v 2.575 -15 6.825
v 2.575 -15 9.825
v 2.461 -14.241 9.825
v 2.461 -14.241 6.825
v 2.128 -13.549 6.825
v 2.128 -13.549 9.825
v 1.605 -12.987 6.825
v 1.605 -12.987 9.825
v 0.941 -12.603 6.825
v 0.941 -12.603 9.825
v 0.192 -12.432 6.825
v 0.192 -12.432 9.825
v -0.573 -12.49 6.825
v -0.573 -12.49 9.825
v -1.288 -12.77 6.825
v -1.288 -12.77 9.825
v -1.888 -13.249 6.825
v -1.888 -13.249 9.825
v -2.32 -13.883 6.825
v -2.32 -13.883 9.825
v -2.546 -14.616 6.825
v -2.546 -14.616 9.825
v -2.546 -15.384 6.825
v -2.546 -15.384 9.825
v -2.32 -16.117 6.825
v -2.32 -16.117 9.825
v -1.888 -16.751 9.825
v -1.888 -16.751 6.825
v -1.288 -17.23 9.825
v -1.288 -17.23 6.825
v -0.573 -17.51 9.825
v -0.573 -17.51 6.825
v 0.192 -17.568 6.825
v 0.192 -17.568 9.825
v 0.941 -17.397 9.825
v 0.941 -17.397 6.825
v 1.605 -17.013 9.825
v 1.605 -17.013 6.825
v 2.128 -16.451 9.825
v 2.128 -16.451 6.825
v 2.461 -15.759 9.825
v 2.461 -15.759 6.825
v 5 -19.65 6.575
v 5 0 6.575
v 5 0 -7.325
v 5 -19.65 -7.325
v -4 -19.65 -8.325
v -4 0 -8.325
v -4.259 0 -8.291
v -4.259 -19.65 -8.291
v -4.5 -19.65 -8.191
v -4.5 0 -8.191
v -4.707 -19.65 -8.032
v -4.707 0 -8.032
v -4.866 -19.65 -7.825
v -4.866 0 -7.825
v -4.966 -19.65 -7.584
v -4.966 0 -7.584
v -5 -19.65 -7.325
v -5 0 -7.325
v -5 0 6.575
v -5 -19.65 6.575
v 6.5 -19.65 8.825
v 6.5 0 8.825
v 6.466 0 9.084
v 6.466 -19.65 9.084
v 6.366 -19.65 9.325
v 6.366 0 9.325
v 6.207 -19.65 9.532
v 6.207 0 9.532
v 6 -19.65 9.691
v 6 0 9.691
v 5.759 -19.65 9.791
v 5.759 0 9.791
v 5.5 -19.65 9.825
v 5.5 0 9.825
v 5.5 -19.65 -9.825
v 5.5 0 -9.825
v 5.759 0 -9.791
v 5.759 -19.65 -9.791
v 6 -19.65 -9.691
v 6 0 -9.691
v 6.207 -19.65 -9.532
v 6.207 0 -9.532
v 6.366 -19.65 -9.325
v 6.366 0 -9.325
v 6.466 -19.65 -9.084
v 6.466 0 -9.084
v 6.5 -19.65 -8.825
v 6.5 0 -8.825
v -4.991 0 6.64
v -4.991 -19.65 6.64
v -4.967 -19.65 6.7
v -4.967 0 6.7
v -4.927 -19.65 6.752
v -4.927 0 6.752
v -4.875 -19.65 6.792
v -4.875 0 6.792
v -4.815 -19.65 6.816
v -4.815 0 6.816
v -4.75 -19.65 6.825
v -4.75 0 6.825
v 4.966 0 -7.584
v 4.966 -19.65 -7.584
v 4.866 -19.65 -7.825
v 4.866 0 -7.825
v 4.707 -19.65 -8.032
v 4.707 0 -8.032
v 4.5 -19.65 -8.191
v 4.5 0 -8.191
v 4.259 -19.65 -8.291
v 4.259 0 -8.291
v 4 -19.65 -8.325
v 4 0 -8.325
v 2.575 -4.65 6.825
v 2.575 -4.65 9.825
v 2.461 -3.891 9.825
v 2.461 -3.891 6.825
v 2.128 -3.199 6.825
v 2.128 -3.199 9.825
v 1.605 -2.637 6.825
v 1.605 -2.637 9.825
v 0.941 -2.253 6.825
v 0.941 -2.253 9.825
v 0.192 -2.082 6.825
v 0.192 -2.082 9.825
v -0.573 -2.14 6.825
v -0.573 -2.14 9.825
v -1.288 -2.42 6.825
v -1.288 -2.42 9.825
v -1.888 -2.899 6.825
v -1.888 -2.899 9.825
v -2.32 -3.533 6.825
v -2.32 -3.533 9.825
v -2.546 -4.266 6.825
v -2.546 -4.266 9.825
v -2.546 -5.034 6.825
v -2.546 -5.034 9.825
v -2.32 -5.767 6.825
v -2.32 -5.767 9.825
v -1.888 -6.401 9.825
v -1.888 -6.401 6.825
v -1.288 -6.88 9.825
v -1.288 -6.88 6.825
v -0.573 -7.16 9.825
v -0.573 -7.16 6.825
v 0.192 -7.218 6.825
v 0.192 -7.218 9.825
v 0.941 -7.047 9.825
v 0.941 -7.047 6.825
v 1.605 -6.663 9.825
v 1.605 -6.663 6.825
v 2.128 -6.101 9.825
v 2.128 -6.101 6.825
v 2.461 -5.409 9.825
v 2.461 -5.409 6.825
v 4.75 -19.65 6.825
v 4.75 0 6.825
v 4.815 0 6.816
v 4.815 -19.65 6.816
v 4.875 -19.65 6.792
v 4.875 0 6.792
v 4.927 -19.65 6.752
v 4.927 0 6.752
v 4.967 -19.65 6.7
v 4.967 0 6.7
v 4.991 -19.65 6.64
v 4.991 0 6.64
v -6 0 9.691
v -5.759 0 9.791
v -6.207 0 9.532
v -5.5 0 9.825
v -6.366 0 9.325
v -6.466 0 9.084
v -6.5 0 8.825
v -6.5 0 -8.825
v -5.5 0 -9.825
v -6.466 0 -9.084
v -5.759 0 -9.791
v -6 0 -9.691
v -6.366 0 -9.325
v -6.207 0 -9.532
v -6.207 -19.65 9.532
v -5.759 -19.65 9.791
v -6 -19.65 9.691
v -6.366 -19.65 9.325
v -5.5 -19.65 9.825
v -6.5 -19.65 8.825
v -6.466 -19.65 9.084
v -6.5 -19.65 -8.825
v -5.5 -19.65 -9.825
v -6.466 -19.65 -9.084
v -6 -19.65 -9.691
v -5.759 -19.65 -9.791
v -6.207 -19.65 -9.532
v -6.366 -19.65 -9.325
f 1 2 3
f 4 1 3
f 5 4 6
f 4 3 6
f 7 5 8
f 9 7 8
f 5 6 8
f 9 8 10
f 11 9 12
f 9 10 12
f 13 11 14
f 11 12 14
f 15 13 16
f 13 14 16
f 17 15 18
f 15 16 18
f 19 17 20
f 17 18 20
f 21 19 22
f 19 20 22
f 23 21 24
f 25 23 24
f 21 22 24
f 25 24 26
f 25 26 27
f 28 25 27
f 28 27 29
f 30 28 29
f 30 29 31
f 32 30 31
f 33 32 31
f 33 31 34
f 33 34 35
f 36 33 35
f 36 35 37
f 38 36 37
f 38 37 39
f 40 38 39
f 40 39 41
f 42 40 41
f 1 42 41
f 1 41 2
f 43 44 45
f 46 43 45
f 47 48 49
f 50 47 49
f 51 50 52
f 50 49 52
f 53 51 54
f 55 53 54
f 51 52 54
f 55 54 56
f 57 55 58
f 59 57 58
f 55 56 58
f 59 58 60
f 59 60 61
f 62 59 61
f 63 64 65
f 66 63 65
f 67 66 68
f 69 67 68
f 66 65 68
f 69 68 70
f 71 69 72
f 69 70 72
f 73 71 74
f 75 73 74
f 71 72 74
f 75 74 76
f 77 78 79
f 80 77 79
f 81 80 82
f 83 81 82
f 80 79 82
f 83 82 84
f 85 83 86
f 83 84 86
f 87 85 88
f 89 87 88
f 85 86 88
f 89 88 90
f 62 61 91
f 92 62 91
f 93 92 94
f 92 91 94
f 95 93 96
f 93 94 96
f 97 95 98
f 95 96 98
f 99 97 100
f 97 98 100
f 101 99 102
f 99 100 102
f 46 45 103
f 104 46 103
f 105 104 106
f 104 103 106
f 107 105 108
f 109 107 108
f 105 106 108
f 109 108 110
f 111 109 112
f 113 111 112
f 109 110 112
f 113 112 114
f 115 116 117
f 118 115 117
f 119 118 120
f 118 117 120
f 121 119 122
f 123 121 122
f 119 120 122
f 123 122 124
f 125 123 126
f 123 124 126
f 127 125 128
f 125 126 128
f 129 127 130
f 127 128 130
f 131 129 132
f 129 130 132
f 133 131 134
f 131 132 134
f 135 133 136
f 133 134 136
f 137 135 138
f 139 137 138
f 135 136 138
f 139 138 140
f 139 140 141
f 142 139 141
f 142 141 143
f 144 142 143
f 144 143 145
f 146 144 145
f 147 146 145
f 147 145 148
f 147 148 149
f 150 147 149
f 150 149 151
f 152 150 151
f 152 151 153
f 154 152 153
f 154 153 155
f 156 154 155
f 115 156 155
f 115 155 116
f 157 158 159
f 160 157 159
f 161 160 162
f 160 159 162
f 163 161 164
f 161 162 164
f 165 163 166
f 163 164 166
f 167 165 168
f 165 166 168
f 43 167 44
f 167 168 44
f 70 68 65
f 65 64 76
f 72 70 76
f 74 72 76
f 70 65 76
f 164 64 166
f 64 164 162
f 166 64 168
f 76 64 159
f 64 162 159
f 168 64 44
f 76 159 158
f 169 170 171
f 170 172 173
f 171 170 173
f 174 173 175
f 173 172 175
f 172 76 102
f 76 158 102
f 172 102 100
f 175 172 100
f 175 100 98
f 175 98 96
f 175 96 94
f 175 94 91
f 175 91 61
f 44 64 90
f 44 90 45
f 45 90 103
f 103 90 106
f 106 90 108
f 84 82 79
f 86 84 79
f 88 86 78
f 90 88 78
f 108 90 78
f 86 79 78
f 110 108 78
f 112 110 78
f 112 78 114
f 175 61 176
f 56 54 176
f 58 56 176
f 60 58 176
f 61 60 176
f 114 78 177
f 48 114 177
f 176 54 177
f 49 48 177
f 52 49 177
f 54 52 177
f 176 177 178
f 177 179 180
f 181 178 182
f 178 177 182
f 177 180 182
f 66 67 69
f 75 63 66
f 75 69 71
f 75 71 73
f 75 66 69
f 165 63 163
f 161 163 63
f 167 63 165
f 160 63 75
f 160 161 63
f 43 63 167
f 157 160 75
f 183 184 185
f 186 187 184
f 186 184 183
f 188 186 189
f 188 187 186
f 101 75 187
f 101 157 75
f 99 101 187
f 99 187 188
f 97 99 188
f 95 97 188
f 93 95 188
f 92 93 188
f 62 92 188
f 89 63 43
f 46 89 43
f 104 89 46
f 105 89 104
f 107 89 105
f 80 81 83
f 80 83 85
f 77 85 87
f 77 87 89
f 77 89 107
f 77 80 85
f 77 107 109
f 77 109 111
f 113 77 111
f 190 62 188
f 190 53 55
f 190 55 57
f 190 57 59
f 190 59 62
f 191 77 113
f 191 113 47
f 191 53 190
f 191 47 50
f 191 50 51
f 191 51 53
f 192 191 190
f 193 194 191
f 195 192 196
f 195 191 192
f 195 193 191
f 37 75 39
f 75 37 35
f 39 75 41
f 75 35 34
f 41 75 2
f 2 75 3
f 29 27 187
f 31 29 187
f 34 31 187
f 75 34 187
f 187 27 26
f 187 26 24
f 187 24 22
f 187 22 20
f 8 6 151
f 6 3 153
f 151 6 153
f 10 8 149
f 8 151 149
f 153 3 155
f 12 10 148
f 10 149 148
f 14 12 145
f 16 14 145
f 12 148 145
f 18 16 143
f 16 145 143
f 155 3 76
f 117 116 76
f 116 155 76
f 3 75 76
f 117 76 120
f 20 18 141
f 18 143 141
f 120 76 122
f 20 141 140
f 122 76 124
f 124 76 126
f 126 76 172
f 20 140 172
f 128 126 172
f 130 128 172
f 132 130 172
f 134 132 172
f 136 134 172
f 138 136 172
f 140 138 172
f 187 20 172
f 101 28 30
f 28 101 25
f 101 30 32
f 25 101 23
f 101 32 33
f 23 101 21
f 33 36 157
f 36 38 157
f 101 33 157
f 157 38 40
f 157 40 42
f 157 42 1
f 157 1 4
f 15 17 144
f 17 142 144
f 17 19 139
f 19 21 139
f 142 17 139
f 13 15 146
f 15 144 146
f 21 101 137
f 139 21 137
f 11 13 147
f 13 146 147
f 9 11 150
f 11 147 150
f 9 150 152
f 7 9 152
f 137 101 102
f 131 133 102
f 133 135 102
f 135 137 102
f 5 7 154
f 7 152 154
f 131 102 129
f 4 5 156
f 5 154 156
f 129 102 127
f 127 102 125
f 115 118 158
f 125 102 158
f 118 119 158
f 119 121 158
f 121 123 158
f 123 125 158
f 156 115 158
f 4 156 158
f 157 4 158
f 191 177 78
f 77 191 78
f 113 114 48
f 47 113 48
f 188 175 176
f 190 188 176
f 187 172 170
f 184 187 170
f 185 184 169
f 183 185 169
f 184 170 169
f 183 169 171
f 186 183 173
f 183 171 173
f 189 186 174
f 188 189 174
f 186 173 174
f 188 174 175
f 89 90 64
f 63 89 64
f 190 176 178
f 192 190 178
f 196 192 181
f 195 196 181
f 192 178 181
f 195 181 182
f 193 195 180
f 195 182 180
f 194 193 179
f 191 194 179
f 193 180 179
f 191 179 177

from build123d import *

# Parameters (mm, degrees)
SALIENTE_EXTRUIR1_DEPTH = 19.65
CROQUIS2_R              = 2.575
CORTAR_EXTRUIR1_DEPTH   = 8.65


with BuildPart() as part:
    # Croquis1 → Saliente-Extruir1 (new body)
    with BuildSketch(Plane(origin=(0, 0, 0), x_dir=(1, 0, 0), z_dir=(0, 1, 0))):
        with BuildLine():
            Line((-5.5, 9.825), (5.5, 9.825))
            ThreePointArc((5.5, 9.825), (6.207106781, 9.532106781), (6.5, 8.825))
            Line((6.5, 8.825), (6.5, -8.825))
            ThreePointArc((6.5, -8.825), (6.207106781, -9.532106781), (5.5, -9.825))
            Line((5.5, -9.825), (-5.5, -9.825))
            ThreePointArc((-5.5, -9.825), (-6.207106781, -9.532106781), (-6.5, -8.825))
            Line((-6.5, -8.825), (-6.5, 8.825))
            ThreePointArc((-6.5, 8.825), (-6.207106781, 9.532106781), (-5.5, 9.825))
        make_face()
        with BuildLine():
            Line((-4.75, -6.825), (4.75, -6.825))
            ThreePointArc((4.75, -6.825), (4.926776695, -6.751776695), (5, -6.575))
            Line((5, -6.575), (5, 7.325))
            ThreePointArc((5, 7.325), (4.707106781, 8.032106781), (4, 8.325))
            Line((4, 8.325), (-4, 8.325))
            ThreePointArc((-4, 8.325), (-4.707106781, 8.032106781), (-5, 7.325))
            Line((-5, 7.325), (-5, -6.575))
            ThreePointArc((-5, -6.575), (-4.926776695, -6.751776695), (-4.75, -6.825))
        make_face(mode=Mode.SUBTRACT)
    extrude(amount=-SALIENTE_EXTRUIR1_DEPTH)

    # Croquis2 → Cortar-Extruir1 (cut)
    with BuildSketch(Plane.XY.offset(9.825)):
        with Locations((0, -4.65)):
            Circle(CROQUIS2_R)
        with Locations((0, -15)):
            Circle(CROQUIS2_R)
    extrude(amount=-CORTAR_EXTRUIR1_DEPTH, mode=Mode.SUBTRACT)


solid = part.part
